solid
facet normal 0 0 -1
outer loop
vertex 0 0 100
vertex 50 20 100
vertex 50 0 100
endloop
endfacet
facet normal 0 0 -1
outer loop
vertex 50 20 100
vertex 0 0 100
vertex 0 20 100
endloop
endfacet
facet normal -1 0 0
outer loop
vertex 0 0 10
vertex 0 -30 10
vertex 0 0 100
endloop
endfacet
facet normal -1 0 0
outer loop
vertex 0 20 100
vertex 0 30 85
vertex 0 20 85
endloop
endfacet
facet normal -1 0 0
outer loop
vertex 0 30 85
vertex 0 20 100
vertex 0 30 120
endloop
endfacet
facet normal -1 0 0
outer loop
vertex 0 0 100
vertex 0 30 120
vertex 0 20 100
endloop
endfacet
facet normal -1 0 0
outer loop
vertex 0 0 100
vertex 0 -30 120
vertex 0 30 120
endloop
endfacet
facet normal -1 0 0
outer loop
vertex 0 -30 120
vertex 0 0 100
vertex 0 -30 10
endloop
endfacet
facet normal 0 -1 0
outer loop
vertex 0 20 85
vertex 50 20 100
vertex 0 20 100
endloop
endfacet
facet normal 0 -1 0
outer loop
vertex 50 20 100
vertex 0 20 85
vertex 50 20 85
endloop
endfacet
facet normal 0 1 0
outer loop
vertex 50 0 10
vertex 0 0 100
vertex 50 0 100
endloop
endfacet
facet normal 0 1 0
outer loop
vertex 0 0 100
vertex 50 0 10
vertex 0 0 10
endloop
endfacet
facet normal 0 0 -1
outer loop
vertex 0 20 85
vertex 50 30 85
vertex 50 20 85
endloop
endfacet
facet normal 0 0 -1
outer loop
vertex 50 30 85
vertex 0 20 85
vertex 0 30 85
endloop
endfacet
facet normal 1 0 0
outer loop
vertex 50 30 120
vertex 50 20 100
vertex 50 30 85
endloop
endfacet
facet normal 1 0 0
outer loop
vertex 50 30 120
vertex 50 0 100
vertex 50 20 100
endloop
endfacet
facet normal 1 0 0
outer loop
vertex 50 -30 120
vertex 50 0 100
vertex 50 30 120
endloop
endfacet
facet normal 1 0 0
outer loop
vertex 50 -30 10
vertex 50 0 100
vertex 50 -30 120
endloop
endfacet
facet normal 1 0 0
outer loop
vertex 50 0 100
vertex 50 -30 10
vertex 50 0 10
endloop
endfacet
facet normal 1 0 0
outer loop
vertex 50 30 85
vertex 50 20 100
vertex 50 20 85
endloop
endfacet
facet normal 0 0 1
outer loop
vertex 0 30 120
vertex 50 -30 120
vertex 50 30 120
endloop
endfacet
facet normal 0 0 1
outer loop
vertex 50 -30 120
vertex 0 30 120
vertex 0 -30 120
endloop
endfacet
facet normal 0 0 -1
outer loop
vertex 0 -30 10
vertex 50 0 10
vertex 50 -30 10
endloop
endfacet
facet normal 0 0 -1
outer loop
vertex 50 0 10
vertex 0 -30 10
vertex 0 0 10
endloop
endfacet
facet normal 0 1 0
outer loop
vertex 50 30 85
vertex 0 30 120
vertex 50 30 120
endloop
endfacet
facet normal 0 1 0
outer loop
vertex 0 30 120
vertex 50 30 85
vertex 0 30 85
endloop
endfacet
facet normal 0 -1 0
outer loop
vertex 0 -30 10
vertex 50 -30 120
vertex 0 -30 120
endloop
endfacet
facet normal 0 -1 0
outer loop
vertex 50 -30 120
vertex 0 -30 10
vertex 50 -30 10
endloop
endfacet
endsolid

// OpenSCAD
//Wall Mount Shim for Camera

module Wall(){
	union(){
		cube(size = [500,20,100]);
		translate([0,20,0]) cube(size = [500,20,85]);
	}
}

module Mount(){
	cube(size = [50,60,110]);
}

difference(){
	translate([0,-30,10]) Mount();
	Wall();
}
